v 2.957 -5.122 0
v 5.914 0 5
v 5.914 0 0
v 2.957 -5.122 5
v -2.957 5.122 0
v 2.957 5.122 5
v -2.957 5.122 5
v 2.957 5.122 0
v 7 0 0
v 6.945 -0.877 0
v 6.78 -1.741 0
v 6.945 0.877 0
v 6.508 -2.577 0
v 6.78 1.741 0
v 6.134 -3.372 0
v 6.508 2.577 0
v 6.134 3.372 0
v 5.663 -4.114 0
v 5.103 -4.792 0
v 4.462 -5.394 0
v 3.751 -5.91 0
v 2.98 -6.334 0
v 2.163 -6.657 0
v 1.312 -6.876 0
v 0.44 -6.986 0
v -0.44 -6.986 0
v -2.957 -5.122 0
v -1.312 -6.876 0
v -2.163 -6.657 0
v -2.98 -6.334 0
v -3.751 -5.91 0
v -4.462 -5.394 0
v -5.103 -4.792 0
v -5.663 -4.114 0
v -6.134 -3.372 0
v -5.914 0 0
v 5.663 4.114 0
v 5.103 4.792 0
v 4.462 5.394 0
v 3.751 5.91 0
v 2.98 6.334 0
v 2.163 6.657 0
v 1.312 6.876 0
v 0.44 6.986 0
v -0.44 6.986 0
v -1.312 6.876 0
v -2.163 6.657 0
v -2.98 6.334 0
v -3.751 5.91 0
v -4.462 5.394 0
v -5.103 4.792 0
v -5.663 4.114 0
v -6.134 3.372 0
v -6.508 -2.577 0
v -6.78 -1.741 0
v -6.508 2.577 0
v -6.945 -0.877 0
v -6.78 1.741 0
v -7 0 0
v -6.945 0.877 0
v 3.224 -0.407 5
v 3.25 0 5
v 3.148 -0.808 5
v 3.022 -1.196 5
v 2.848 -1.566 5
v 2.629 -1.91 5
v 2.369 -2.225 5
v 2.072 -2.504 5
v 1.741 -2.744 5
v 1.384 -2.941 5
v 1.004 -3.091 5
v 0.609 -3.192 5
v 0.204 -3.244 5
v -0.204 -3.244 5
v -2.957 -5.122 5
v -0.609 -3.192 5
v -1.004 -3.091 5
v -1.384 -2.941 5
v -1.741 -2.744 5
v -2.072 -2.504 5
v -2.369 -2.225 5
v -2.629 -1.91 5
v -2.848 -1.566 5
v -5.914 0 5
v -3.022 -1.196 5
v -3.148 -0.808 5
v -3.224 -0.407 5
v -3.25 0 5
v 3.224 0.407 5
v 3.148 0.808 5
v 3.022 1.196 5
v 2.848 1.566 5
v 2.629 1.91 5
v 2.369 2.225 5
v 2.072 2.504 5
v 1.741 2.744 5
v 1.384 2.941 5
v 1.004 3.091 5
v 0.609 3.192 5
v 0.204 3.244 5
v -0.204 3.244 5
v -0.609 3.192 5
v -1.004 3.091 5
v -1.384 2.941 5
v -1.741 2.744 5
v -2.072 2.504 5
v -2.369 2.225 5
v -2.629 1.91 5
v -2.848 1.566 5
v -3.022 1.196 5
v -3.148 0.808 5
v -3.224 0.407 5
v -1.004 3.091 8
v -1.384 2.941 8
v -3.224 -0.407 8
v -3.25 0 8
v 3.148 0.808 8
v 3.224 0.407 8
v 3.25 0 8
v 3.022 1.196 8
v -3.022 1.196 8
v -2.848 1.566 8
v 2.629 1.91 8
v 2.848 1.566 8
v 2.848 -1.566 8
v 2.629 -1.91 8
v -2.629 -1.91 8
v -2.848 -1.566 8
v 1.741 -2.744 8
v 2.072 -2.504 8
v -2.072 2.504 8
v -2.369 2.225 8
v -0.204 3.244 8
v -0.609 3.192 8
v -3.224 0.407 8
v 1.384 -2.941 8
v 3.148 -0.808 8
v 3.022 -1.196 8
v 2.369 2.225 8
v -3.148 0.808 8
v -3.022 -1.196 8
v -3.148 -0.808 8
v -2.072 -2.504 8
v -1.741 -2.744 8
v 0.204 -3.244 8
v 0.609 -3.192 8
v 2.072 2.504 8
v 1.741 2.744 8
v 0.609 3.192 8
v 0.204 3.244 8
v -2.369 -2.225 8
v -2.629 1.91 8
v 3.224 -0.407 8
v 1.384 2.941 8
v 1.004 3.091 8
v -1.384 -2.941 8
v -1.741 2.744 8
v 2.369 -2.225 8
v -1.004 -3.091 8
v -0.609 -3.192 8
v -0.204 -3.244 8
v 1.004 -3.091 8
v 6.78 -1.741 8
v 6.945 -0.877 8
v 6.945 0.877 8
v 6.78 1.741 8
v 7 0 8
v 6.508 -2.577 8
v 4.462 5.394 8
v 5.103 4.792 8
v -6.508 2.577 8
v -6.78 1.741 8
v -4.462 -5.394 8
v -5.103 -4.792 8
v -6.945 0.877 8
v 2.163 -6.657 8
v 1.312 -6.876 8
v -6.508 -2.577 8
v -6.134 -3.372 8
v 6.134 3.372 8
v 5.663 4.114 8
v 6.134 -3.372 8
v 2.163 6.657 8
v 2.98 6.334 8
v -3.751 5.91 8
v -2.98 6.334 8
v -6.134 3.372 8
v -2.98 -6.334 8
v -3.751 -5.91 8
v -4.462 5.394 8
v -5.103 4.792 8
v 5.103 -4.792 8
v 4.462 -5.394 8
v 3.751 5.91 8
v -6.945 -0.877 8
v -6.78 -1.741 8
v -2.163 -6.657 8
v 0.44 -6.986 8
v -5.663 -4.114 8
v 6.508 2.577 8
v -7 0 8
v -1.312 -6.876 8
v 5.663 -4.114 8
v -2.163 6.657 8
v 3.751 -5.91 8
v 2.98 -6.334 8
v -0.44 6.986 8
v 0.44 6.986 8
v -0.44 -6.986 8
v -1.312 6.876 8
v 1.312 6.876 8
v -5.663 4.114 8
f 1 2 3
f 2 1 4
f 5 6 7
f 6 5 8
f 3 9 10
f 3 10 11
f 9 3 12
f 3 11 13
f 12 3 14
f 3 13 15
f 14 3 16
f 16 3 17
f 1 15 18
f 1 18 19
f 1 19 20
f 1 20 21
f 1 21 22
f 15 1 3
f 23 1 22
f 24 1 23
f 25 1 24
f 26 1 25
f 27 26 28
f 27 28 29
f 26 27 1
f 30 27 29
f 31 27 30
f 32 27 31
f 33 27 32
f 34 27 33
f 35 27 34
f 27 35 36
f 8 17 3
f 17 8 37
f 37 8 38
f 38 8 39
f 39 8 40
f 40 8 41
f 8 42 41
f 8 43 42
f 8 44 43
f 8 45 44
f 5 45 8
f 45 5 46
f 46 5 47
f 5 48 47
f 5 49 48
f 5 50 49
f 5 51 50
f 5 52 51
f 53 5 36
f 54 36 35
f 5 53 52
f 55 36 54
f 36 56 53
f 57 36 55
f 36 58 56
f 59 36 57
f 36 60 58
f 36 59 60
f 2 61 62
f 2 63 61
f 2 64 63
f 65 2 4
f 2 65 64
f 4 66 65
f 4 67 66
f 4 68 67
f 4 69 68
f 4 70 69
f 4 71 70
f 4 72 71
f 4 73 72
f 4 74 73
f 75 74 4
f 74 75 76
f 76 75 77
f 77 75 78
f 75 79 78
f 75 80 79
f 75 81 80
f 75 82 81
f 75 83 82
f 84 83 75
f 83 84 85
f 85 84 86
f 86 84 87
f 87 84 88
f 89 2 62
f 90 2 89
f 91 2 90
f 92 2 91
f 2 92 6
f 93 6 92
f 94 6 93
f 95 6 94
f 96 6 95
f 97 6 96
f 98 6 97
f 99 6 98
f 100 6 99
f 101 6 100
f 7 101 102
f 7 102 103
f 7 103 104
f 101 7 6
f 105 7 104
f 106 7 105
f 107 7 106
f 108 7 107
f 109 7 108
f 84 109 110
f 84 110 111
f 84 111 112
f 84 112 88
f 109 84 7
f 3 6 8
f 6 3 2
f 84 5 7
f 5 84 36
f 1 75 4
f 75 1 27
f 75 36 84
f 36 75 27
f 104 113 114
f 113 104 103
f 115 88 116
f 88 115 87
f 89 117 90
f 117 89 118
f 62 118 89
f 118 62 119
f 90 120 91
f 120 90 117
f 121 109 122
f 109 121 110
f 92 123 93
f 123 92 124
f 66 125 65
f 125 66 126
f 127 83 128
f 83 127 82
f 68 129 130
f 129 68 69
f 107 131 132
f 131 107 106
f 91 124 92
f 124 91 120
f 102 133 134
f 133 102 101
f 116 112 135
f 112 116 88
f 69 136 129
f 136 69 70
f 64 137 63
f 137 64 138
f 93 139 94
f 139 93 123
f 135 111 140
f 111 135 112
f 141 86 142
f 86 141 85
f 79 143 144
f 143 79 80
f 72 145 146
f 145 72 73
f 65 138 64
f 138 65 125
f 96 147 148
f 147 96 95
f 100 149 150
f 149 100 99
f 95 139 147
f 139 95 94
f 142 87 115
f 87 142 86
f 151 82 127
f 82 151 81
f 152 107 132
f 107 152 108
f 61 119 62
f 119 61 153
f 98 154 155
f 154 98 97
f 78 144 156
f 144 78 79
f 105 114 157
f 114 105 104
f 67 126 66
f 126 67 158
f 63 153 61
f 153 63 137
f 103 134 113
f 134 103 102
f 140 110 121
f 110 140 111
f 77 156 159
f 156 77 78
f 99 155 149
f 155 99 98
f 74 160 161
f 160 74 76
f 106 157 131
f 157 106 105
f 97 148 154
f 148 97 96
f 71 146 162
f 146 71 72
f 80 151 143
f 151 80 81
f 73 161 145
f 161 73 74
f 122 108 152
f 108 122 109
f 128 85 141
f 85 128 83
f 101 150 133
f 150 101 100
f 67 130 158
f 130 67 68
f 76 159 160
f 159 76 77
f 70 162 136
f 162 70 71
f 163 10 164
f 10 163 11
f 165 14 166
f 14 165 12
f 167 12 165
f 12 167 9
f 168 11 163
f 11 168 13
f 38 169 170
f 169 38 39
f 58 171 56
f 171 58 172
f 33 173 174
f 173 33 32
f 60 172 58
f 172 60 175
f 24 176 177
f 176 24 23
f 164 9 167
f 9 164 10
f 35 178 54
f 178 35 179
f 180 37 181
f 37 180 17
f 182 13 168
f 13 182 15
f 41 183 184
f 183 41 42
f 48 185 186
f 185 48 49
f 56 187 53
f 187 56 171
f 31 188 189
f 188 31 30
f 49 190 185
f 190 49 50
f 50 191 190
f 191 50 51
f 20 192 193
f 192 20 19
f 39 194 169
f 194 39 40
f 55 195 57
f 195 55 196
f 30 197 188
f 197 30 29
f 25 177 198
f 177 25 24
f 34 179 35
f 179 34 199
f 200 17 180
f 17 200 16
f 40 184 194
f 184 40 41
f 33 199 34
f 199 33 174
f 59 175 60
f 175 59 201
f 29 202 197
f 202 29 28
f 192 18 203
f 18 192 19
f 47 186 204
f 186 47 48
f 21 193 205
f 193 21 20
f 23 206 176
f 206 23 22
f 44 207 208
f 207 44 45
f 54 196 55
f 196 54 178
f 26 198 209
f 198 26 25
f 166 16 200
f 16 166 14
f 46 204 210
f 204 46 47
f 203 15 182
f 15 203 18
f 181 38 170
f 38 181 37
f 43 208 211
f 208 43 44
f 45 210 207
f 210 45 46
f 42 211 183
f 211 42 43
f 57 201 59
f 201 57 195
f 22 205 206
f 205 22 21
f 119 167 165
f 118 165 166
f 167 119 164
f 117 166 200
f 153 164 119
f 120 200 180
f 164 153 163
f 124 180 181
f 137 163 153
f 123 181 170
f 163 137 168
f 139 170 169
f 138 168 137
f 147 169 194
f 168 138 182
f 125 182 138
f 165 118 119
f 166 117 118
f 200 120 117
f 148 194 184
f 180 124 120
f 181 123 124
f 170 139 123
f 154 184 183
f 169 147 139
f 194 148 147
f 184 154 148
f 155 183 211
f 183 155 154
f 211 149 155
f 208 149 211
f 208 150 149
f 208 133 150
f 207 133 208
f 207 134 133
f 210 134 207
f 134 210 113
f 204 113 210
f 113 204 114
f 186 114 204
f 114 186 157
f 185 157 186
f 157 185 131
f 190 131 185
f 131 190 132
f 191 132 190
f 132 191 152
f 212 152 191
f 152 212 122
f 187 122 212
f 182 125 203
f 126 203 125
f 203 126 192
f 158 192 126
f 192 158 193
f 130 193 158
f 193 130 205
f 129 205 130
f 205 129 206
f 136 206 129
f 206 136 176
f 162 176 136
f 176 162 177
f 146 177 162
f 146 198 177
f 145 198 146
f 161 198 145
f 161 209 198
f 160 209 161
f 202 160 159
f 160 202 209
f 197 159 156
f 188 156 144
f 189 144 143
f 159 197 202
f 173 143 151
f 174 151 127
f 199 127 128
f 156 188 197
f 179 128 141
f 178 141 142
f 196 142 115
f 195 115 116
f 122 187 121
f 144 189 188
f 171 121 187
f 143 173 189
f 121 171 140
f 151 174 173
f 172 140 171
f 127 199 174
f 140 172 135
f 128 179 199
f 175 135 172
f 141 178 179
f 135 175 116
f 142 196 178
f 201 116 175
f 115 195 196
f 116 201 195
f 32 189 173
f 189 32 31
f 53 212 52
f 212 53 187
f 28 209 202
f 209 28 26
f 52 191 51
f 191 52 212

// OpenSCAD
$fn = 50;


difference() {
	union() {
		cylinder(h = 8, r = 7.0000000000);
	}
	union() {
		translate(v = [0, 0, 0]) {
			rotate(a = [0, 0, 0]) {
				difference() {
					union() {
						#linear_extrude(height = 5) {
							polygon(points = [[5.9142500000, 0.0000000000], [2.9571250000, 5.1218907443], [-2.9571250000, 5.1218907443], [-5.9142500000, 0.0000000000], [-2.9571250000, -5.1218907443], [2.9571250000, -5.1218907443]]);
						}
					}
					union();
				}
			}
		}
		translate(v = [0, 0, -100]) {
			cylinder(h = 200, r = 3.2500000000);
		}
		translate(v = [0, 0, -100]) {
			cylinder(h = 200, r = 1.8000000000);
		}
	}
}
